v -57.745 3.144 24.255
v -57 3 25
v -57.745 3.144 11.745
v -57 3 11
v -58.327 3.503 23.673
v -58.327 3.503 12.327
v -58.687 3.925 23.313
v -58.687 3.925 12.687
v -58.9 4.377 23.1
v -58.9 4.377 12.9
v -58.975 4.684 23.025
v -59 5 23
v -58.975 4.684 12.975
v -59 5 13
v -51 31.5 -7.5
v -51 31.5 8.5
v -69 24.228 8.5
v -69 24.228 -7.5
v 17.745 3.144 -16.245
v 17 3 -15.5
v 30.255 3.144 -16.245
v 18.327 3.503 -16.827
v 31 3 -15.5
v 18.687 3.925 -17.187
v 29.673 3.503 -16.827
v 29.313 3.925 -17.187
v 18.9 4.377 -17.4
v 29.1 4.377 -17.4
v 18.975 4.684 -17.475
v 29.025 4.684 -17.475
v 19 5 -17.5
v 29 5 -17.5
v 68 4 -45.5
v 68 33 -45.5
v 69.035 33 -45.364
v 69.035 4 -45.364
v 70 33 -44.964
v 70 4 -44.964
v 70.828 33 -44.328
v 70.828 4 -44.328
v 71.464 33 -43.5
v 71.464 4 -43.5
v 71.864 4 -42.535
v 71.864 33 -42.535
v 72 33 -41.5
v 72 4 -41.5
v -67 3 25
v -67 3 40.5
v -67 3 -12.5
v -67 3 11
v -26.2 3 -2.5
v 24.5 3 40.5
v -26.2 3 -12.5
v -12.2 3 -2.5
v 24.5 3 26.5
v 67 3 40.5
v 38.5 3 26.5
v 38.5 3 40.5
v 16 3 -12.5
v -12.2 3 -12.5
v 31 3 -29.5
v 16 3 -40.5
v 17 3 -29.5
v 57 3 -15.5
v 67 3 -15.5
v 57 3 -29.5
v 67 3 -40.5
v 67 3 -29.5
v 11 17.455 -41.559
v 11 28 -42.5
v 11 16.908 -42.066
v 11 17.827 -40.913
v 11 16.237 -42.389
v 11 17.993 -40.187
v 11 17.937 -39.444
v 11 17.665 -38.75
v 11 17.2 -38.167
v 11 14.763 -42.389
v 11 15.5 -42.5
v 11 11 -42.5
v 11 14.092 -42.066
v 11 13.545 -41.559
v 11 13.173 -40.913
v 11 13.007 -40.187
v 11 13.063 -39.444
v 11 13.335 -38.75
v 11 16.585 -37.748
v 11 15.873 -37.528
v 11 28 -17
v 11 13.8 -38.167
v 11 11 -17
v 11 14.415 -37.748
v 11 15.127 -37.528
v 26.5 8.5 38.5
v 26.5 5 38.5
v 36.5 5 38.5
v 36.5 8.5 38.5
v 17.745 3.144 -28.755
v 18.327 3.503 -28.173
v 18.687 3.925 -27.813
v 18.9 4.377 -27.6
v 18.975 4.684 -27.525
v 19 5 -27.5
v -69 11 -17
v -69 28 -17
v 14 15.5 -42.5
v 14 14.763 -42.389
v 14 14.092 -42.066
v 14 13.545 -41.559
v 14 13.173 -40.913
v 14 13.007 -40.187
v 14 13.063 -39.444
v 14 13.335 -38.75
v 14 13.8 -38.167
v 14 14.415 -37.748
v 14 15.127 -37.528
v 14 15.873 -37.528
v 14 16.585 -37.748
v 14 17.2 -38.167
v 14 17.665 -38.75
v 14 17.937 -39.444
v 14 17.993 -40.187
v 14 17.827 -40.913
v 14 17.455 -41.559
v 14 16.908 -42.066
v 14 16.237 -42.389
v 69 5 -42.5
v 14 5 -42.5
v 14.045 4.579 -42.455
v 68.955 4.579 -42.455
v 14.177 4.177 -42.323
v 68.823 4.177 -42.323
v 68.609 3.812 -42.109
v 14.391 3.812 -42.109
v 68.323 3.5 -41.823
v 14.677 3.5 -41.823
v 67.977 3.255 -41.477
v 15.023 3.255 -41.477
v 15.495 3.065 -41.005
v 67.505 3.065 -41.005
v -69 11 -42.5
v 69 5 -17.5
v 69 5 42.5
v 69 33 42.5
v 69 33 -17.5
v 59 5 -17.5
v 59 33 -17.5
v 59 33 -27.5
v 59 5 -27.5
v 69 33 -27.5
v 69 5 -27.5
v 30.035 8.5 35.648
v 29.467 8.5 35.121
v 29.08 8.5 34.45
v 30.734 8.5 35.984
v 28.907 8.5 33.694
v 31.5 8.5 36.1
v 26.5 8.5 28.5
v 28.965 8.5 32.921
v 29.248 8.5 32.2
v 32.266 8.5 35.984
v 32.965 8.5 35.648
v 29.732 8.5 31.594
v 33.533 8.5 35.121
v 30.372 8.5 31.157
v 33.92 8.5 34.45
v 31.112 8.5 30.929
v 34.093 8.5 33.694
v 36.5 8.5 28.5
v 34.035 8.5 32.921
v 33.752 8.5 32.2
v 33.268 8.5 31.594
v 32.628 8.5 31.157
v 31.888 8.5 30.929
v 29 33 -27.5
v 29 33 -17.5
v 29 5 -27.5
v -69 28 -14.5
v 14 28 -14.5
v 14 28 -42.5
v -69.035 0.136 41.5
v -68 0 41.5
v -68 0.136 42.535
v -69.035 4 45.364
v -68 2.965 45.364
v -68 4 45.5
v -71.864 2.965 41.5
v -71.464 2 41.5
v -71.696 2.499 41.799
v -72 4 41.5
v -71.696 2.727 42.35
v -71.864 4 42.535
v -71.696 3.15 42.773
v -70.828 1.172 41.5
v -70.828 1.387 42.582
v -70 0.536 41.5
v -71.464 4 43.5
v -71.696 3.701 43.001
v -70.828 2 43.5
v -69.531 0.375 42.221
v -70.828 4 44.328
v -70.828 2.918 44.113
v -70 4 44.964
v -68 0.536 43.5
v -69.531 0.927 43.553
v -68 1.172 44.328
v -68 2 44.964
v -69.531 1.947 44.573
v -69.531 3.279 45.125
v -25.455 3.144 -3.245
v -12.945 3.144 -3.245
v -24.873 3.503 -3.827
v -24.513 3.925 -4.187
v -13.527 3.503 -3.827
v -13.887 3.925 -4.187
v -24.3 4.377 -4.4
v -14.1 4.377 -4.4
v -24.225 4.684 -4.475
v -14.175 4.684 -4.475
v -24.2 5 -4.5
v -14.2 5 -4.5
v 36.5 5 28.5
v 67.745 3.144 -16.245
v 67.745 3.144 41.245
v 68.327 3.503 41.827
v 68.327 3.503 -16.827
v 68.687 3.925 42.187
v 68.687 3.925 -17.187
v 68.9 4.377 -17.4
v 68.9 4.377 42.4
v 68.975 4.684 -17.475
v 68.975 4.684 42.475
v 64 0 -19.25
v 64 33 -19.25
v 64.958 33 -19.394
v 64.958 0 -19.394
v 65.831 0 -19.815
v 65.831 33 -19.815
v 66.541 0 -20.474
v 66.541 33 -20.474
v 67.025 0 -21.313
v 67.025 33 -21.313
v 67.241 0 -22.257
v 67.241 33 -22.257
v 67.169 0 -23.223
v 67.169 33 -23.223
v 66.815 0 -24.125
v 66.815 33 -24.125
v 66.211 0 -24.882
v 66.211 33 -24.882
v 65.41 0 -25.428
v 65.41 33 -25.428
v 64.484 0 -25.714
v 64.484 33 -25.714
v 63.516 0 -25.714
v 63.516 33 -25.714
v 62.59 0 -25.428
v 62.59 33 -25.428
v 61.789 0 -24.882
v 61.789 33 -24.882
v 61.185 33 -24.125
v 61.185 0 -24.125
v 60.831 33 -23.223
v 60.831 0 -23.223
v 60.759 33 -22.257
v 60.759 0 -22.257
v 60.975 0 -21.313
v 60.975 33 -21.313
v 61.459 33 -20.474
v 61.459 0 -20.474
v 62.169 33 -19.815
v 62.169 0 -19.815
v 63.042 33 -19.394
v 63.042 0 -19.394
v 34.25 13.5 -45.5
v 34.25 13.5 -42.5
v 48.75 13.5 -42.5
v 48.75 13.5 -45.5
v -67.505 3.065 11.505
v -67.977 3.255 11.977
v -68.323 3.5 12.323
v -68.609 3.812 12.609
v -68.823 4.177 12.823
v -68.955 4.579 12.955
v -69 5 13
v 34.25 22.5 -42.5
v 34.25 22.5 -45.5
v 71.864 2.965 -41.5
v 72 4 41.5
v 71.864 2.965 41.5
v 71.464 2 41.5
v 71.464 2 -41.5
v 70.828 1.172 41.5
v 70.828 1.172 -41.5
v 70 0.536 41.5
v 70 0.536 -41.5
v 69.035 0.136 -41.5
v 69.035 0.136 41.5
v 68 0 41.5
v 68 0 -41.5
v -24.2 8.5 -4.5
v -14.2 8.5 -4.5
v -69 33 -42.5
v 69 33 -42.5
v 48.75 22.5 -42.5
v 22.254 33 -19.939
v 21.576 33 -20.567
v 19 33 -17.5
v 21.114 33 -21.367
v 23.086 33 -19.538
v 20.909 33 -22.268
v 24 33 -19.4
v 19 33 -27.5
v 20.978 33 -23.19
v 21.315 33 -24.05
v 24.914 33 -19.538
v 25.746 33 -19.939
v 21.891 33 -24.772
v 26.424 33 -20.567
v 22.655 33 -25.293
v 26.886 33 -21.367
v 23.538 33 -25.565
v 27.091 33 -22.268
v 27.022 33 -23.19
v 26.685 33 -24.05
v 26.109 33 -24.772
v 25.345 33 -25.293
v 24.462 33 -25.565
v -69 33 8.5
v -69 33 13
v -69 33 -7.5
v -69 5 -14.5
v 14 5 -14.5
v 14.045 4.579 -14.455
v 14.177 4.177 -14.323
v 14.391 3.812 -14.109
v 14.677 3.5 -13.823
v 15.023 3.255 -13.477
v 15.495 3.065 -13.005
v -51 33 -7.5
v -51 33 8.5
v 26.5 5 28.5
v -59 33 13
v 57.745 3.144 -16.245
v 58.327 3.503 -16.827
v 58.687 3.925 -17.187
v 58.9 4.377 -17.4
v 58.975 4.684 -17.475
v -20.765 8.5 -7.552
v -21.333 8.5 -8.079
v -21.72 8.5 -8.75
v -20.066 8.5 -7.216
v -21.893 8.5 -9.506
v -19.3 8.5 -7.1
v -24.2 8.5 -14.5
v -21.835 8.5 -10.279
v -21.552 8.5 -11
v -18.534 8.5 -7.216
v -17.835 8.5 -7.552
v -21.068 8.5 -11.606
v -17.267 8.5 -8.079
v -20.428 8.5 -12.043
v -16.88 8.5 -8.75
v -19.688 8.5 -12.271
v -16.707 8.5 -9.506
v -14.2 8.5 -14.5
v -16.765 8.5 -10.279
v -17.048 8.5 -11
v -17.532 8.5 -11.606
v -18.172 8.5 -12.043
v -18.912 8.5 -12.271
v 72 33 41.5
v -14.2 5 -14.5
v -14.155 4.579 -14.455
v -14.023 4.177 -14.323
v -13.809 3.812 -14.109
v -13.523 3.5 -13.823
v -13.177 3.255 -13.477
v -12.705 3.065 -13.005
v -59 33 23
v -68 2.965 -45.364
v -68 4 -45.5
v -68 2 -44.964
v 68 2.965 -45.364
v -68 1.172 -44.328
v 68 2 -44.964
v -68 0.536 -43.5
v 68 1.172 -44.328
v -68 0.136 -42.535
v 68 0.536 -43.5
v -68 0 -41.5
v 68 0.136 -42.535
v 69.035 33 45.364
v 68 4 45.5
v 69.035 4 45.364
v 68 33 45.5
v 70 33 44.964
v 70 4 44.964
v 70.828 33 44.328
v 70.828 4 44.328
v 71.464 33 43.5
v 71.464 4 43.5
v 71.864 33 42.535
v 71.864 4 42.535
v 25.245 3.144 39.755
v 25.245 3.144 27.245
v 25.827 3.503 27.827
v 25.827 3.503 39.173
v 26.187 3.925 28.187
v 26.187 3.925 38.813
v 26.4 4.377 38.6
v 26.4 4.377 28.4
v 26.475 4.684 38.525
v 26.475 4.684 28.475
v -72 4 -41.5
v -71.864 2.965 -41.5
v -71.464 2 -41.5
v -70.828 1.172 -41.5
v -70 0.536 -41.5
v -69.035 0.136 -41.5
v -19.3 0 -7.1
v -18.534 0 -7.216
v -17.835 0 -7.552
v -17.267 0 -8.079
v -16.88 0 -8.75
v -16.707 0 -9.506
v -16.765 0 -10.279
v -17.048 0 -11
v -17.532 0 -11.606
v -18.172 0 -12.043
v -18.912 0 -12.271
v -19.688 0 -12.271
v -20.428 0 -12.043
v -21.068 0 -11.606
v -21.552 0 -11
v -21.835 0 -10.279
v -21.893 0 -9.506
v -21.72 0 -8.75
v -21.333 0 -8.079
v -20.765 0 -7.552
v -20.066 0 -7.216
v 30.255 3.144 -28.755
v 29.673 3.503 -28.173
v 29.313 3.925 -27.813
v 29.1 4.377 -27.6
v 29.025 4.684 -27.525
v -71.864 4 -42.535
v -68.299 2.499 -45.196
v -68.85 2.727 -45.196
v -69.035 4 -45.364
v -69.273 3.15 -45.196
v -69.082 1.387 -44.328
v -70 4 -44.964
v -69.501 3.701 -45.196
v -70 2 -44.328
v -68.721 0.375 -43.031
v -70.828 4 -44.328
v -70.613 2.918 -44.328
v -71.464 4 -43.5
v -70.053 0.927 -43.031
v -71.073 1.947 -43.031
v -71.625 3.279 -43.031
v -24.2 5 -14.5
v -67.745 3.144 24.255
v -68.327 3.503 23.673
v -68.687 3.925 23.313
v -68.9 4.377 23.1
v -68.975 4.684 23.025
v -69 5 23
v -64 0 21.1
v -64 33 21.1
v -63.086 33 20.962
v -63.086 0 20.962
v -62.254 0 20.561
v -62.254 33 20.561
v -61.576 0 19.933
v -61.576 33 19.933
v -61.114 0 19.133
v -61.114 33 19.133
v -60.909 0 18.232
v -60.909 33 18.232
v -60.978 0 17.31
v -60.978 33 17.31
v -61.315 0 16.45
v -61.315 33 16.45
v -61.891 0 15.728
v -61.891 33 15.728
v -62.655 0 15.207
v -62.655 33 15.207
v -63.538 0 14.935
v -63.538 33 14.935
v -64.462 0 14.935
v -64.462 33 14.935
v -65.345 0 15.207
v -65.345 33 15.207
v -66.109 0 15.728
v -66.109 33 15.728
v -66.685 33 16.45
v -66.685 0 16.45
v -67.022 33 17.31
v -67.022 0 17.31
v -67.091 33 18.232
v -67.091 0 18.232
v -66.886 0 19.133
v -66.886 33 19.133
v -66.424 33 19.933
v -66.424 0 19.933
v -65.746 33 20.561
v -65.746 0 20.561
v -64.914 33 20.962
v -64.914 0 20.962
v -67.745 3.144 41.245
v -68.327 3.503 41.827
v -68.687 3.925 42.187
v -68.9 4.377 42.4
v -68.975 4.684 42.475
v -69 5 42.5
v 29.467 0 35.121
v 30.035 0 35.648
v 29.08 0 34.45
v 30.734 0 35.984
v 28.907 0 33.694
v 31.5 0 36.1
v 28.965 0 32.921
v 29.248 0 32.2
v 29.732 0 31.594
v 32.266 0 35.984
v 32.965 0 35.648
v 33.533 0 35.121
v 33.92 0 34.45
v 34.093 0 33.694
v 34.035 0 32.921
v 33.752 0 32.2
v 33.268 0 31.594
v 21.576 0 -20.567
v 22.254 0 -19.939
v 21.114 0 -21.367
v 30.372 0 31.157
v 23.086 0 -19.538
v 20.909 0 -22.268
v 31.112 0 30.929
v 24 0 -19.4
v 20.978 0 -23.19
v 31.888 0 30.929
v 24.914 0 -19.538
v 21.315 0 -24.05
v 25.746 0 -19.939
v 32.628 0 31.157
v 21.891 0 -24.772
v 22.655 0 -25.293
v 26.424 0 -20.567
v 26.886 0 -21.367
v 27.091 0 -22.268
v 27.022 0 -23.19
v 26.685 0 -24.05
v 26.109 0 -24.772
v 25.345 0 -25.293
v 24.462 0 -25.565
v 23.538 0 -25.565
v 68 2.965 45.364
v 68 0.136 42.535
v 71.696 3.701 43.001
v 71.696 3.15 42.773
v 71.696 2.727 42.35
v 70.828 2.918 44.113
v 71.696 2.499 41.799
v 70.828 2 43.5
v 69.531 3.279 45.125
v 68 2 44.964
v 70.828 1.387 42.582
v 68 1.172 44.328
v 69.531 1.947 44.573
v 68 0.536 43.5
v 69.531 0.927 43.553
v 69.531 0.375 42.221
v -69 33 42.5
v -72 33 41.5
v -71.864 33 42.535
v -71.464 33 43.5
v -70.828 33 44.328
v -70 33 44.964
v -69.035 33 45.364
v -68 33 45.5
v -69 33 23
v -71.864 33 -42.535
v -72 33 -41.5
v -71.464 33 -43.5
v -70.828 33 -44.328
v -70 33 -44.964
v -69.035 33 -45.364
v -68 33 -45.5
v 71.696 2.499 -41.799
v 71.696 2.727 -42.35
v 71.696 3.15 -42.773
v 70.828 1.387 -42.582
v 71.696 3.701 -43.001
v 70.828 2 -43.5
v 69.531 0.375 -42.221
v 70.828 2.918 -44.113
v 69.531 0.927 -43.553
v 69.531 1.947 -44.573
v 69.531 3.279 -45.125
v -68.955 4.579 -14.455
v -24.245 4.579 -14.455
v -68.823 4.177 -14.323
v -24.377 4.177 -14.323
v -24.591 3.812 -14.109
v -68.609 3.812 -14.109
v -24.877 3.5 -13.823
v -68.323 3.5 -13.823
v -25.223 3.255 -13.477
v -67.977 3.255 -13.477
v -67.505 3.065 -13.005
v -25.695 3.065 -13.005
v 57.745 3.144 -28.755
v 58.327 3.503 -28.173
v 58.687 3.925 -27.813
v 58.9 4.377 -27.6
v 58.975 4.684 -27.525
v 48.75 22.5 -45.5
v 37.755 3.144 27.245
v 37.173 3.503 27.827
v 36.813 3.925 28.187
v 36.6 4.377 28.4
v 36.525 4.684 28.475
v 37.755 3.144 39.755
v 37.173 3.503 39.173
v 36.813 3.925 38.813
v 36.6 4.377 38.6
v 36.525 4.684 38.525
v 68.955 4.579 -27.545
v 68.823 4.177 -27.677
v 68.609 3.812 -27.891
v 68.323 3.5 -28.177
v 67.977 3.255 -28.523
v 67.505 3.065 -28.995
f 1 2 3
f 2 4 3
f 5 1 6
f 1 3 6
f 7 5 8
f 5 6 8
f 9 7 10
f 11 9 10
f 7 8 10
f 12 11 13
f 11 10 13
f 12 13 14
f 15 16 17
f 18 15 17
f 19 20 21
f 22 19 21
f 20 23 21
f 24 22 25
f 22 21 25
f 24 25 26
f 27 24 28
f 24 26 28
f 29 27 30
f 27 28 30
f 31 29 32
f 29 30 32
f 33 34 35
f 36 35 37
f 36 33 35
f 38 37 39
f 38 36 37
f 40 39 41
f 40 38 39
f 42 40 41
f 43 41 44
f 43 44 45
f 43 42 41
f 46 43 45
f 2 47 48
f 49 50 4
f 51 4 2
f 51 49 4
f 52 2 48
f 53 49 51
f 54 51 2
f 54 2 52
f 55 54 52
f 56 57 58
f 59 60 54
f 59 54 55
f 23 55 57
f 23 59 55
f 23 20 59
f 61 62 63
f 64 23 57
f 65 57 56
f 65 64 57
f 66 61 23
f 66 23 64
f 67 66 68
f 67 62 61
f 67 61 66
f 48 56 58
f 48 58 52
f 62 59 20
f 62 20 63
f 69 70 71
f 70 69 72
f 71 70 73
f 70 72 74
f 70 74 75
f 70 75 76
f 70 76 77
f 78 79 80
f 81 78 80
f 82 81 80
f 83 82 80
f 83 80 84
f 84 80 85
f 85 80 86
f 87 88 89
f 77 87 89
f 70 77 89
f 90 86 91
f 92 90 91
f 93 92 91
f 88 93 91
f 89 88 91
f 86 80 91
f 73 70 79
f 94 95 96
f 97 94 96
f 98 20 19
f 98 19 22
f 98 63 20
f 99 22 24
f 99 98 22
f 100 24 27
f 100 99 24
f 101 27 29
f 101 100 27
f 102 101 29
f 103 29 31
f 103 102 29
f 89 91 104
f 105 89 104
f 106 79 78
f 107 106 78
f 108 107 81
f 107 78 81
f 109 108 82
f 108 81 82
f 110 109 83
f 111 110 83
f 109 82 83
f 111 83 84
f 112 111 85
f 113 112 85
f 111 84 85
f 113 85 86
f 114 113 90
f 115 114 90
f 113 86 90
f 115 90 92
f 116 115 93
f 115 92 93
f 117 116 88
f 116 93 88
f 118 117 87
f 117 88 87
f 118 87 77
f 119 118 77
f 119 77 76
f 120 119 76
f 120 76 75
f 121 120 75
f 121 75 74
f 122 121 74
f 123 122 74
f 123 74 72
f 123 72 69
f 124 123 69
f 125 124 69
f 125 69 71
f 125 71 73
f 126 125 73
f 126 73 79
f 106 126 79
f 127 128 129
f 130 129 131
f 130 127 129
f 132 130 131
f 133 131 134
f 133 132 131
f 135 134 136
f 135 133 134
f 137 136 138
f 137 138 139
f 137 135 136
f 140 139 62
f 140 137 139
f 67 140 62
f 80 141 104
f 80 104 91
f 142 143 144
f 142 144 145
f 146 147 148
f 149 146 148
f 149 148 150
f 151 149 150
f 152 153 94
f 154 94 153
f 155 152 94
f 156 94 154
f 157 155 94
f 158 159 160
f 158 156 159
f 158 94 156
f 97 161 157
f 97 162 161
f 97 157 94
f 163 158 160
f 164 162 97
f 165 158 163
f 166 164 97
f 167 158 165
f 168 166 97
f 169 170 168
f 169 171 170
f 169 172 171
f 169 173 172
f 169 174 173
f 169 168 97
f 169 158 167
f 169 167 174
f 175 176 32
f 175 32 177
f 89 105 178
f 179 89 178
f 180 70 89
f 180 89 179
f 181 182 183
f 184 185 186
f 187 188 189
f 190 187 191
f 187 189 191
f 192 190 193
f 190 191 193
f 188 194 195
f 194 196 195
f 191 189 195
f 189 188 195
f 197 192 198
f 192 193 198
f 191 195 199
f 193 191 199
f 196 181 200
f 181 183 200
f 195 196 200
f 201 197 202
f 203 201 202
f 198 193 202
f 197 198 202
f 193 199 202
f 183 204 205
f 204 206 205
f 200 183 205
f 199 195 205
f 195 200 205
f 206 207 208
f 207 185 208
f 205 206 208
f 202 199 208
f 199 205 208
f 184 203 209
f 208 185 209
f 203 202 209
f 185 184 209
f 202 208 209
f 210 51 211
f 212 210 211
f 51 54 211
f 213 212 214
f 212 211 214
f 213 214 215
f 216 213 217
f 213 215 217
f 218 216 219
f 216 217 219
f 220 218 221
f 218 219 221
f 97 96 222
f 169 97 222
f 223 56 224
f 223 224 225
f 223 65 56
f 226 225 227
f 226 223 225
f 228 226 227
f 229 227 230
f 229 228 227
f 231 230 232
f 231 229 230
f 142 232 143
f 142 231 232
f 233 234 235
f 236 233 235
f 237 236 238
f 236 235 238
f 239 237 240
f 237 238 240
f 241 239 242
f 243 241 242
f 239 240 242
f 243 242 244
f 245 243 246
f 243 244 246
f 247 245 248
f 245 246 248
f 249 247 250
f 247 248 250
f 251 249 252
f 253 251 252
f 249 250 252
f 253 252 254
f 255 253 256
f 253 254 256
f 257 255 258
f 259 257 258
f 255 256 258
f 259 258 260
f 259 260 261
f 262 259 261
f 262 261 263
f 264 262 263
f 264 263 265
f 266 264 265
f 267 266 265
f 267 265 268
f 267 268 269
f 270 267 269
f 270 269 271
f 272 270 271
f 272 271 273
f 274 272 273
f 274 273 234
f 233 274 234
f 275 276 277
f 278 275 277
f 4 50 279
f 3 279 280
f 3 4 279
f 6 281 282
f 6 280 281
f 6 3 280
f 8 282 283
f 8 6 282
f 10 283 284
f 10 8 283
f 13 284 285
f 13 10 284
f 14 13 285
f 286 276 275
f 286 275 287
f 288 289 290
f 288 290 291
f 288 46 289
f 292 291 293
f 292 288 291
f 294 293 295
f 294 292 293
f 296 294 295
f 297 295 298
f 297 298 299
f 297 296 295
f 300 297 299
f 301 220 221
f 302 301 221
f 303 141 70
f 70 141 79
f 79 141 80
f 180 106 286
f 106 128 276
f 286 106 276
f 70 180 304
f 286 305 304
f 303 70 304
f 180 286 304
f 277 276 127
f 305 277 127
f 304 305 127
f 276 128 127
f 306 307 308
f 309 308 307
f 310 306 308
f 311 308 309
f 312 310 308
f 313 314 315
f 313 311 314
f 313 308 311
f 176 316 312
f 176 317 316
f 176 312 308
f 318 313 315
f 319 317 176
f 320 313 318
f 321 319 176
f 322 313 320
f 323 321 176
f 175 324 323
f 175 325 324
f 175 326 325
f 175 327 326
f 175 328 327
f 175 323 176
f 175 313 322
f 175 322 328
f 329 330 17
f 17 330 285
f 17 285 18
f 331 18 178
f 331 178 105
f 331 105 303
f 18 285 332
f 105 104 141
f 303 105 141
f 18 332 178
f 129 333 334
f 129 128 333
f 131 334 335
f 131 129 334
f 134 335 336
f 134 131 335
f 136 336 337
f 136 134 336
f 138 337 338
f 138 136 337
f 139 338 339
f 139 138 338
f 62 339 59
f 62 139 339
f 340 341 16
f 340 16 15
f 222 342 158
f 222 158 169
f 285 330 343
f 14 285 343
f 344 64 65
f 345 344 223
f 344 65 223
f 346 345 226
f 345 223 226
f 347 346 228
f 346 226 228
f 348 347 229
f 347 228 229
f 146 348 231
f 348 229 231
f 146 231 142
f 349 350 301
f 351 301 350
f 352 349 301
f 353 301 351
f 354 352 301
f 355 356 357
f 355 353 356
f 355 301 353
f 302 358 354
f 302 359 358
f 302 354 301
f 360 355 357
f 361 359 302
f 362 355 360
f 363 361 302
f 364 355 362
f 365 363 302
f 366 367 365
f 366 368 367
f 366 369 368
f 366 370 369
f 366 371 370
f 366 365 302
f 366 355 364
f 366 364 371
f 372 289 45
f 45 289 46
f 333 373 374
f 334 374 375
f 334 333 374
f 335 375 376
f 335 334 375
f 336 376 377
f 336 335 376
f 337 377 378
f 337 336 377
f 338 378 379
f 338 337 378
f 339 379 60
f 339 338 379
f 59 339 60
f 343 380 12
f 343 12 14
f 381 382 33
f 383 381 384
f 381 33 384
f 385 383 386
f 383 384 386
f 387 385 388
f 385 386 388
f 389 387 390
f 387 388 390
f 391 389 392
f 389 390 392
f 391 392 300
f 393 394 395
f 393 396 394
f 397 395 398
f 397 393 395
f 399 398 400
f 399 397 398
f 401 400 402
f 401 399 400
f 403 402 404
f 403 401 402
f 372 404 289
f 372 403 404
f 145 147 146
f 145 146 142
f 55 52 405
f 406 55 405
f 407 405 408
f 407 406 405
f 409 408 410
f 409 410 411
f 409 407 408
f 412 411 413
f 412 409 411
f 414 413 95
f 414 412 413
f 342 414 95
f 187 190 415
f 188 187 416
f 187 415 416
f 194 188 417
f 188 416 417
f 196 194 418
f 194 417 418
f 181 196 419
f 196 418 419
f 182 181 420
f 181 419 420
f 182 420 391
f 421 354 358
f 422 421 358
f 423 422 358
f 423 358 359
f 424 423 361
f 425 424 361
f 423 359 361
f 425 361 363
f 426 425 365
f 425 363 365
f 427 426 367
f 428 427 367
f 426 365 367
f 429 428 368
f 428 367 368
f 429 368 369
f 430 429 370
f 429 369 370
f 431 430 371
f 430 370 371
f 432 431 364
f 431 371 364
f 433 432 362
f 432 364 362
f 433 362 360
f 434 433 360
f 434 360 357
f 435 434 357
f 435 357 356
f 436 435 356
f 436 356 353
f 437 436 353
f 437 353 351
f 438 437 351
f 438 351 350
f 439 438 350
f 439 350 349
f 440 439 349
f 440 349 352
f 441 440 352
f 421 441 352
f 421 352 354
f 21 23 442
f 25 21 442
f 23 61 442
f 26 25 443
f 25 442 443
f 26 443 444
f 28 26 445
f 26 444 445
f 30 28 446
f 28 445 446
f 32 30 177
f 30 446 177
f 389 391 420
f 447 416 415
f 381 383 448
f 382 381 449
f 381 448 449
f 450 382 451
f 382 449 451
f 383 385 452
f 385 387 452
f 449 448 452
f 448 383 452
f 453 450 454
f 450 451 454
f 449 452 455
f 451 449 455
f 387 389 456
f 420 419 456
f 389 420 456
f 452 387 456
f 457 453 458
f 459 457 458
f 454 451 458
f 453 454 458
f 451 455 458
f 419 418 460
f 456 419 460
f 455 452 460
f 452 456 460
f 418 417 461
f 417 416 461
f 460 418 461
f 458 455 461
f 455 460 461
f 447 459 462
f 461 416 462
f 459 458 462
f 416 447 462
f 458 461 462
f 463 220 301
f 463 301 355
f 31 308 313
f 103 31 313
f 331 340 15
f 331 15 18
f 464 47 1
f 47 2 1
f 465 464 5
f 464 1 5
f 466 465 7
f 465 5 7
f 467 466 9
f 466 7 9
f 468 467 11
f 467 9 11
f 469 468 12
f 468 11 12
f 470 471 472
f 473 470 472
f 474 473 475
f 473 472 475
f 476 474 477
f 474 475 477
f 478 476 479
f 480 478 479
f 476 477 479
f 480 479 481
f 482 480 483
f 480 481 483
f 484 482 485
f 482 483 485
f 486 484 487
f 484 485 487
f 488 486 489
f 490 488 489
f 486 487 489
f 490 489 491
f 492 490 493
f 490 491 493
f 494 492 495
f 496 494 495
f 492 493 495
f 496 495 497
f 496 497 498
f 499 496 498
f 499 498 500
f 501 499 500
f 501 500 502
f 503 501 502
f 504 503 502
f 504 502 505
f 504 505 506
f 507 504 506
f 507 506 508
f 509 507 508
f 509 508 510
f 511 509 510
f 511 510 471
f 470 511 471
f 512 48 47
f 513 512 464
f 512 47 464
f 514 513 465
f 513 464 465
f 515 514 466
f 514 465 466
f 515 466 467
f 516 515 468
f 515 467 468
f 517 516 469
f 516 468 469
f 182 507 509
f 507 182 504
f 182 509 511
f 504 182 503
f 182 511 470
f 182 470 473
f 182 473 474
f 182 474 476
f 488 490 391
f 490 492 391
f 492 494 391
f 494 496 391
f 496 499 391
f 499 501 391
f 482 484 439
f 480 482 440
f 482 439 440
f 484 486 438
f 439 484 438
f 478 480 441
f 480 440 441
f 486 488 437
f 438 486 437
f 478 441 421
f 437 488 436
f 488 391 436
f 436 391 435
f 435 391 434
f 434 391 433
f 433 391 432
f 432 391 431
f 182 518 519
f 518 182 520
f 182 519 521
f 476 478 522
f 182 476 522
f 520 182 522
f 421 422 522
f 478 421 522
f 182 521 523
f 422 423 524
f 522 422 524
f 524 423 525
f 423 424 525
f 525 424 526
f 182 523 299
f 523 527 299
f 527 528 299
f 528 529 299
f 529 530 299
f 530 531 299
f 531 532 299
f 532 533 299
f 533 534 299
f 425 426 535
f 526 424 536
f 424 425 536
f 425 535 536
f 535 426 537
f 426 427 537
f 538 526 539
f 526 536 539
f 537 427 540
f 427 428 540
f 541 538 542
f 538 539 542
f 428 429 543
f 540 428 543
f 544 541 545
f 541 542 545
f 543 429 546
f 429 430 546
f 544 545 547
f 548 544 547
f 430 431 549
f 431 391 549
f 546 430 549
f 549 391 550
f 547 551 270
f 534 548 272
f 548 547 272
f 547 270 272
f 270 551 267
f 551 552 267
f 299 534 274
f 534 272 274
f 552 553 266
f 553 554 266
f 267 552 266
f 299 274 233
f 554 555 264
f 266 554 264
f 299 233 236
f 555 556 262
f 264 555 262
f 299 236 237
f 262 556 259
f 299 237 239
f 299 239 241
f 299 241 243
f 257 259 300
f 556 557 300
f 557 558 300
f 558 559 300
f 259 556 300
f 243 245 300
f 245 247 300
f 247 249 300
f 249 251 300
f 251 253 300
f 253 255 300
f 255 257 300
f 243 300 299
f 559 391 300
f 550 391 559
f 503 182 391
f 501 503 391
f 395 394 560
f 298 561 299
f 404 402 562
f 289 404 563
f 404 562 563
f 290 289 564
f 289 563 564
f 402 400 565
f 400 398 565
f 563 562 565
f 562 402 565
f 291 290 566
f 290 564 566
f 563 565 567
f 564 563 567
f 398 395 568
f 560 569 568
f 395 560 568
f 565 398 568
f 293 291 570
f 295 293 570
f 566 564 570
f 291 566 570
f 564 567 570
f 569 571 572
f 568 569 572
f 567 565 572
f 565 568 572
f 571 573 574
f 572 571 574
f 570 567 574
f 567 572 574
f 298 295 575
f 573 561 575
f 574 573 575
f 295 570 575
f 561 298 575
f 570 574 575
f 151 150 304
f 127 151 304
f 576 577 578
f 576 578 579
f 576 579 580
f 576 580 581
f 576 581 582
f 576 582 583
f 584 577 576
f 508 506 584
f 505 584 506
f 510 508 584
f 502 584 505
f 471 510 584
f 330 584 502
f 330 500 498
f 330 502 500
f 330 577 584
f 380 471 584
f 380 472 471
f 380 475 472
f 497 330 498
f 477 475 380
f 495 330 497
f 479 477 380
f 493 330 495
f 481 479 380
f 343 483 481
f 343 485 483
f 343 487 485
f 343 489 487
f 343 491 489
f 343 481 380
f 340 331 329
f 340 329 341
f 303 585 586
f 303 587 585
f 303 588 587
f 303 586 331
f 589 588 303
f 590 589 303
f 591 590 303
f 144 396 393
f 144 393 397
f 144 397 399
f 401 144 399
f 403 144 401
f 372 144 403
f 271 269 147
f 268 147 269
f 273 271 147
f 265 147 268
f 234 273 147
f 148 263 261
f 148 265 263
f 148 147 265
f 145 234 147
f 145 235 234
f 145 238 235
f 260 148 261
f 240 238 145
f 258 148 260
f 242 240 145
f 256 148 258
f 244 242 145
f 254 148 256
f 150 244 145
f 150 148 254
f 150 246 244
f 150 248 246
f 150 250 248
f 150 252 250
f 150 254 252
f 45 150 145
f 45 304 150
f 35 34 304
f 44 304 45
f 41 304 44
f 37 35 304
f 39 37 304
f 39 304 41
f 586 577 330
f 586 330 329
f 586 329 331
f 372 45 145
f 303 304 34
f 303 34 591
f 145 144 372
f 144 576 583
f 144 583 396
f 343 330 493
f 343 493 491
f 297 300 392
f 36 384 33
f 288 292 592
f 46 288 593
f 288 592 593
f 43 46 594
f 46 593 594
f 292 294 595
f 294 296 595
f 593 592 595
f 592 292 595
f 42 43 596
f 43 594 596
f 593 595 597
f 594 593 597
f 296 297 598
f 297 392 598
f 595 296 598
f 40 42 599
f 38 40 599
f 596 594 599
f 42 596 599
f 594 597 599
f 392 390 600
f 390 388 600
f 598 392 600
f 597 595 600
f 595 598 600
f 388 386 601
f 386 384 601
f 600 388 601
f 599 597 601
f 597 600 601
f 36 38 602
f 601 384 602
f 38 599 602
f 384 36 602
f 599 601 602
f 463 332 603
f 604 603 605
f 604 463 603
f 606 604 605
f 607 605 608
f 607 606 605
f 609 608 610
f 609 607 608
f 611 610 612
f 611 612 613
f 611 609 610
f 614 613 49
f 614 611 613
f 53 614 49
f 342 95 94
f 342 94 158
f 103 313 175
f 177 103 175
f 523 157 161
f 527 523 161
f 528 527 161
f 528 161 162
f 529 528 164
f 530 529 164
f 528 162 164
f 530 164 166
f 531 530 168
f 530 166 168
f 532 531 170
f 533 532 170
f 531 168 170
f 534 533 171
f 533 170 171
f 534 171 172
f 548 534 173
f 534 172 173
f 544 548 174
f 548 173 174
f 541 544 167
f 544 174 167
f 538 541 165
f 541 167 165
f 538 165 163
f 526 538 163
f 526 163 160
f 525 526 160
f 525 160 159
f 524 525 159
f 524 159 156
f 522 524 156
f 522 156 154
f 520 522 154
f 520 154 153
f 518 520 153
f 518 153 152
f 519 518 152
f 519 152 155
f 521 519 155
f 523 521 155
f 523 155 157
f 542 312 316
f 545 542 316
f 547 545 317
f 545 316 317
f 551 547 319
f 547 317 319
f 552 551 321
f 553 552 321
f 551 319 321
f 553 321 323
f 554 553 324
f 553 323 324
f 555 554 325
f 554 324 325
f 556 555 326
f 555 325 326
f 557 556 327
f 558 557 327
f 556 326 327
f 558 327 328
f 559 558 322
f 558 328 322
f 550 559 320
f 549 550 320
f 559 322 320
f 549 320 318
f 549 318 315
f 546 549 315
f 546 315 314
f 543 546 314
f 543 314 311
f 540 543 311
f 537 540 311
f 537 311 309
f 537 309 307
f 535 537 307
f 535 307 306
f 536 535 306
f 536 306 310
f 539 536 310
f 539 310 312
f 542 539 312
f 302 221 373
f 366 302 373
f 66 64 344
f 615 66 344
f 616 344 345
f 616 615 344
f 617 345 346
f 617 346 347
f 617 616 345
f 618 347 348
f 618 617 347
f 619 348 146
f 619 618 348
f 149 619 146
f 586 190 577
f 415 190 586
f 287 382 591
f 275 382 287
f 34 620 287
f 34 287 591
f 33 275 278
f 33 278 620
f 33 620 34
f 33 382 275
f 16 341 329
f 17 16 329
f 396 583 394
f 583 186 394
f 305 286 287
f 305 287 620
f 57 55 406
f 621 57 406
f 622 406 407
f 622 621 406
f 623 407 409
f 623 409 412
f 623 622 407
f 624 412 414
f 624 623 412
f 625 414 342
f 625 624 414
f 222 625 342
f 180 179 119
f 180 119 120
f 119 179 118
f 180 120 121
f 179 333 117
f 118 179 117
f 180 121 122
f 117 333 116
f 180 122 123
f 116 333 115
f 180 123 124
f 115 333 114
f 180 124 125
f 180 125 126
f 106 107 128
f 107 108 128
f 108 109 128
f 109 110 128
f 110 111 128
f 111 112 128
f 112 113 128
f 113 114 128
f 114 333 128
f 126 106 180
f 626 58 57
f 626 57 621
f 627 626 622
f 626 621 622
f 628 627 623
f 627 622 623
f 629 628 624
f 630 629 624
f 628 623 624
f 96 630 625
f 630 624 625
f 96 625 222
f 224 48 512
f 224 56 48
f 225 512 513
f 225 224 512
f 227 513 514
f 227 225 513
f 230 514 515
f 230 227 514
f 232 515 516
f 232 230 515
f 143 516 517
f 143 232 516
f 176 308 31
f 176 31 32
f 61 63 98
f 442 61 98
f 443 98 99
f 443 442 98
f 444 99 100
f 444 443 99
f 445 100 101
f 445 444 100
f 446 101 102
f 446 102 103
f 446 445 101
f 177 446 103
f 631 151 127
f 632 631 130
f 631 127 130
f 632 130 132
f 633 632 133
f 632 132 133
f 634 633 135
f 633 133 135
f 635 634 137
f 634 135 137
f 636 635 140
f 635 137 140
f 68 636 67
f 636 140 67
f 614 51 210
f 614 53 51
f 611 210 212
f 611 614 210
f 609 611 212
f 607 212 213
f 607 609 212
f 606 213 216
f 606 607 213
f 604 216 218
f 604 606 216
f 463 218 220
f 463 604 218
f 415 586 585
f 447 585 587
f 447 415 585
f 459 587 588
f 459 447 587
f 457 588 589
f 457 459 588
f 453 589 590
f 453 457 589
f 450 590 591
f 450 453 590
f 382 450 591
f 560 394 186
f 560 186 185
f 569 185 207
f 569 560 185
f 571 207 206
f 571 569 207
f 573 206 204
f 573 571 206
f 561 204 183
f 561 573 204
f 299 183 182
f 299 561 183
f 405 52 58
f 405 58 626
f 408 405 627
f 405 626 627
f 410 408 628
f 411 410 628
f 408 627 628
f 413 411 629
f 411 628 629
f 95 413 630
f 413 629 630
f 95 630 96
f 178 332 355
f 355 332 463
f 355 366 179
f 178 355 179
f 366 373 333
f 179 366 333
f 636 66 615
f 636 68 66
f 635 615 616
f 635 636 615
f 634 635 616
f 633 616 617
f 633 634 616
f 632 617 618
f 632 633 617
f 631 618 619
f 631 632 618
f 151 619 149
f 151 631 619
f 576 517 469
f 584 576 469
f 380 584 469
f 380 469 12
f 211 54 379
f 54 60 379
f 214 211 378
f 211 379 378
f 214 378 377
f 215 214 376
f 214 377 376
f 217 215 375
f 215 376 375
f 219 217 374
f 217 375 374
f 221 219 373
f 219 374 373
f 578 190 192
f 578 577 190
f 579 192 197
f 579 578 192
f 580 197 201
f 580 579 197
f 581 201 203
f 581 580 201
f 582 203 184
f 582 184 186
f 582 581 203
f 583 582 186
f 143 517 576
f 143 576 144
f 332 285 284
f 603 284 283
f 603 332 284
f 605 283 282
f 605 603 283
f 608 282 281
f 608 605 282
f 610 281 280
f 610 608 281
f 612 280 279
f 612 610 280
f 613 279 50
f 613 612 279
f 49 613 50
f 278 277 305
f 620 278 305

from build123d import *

# Parameters (mm, degrees)
CROQUIS1_W               = 138
CROQUIS1_H               = 85
SALIENTE_EXTRUIR1_DEPTH  = 3
CROQUIS3_W               = 144
CROQUIS3_H               = 91
CROQUIS3_W_2             = 138
CROQUIS3_H_2             = 85
SALIENTE_EXTRUIR3_DEPTH  = 3
CROQUIS7_W               = 144
CROQUIS7_H               = 91
CROQUIS7_W_2             = 138
CROQUIS7_H_2             = 85
SALIENTE_EXTRUIR4_DEPTH  = 30
CROQUIS8_W               = 10
CROQUIS8_H               = 10
SALIENTE_EXTRUIR5_DEPTH  = 5.5
CROQUIS9_W               = 16
CROQUIS9_H               = 1.5
SALIENTE_EXTRUIR6_DEPTH  = 18
SALIENTE_EXTRUIR7_DEPTH  = 16
CROQUIS11_W              = 83
CROQUIS11_H              = 28
SALIENTE_EXTRUIR8_DEPTH  = 8
SALIENTE_EXTRUIR9_DEPTH  = 17
CORTAR_EXTRUIR1_REACH    = 102.241
CROQUIS14_R              = 2.5
CORTAR_EXTRUIR2_REACH    = 90.626
CROQUIS15_R              = 2.6
CORTAR_EXTRUIR3_REACH    = 120.393
CROQUIS16_W              = 14.5
CROQUIS16_H              = 9
CROQUIS17_W              = 10
CROQUIS17_H              = 10
SALIENTE_EXTRUIR10_DEPTH = 30
CORTAR_EXTRUIR4_REACH    = 93.341
CROQUIS18_R              = 3.1
CROQUIS18_R_2            = 3.25
REDONDEO1_R              = 2
REDONDEO2_R              = 4
CORTAR_EXTRUIR5_REACH    = 90.626
CROQUIS21_R              = 2.6


with BuildPart() as part:
    # Croquis1 → Saliente-Extruir1 (new body)
    with BuildSketch(Plane(origin=(0, 0, 0), x_dir=(1, 0, 0), z_dir=(0, 1, 0))):
        Rectangle(CROQUIS1_W, CROQUIS1_H)
    extrude(amount=SALIENTE_EXTRUIR1_DEPTH)

    # Croquis3 → Saliente-Extruir3 (add)
    with BuildSketch(Plane(origin=(0, 3, 0), x_dir=(1, 0, 0), z_dir=(0, 1, 0))):
        Rectangle(CROQUIS3_W, CROQUIS3_H)
        Rectangle(CROQUIS3_W_2, CROQUIS3_H_2, mode=Mode.SUBTRACT)
    extrude(amount=-SALIENTE_EXTRUIR3_DEPTH)

    # Croquis7 → Saliente-Extruir4 (add)
    with BuildSketch(Plane(origin=(0, 3, 0), x_dir=(1, 0, 0), z_dir=(0, 1, 0))):
        Rectangle(CROQUIS7_W, CROQUIS7_H)
        Rectangle(CROQUIS7_W_2, CROQUIS7_H_2, mode=Mode.SUBTRACT)
    extrude(amount=SALIENTE_EXTRUIR4_DEPTH)

    # Croquis8 → Saliente-Extruir5 (add)
    with BuildSketch(Plane(origin=(0, 3, 0), x_dir=(1, 0, 0), z_dir=(0, 1, 0))):
        with Locations((-19.2, 9.5)):
            Rectangle(CROQUIS8_W, CROQUIS8_H)
        with Locations((31.5, -33.5)):
            Rectangle(CROQUIS8_W, CROQUIS8_H)
    extrude(amount=SALIENTE_EXTRUIR5_DEPTH)

    # Croquis9 → Saliente-Extruir6 (add)
    with BuildSketch(Plane(origin=(-69, 0, 0), x_dir=(0, 0, -1), z_dir=(1, 0, 0))):
        with Locations((-0.5, 32.25)):
            Rectangle(CROQUIS9_W, CROQUIS9_H)
    extrude(amount=SALIENTE_EXTRUIR6_DEPTH)

    # Croquis10 → Saliente-Extruir7 (add)
    with BuildSketch(Plane.XY.offset(8.5)):
        Polygon((-51, 31.5), (-69, 24.227527935), (-69, 33), (-51, 33), align=None)
    extrude(amount=-SALIENTE_EXTRUIR7_DEPTH)

    # Croquis11 → Saliente-Extruir8 (add)
    with BuildSketch(Plane(origin=(0, 3, 0), x_dir=(1, 0, 0), z_dir=(0, 1, 0))):
        with Locations((-27.5, 28.5)):
            Rectangle(CROQUIS11_W, CROQUIS11_H)
    extrude(amount=SALIENTE_EXTRUIR8_DEPTH)

    # Croquis12 → Saliente-Extruir9 (add)
    with BuildSketch(Plane(origin=(0, 11, 0), x_dir=(1, 0, 0), z_dir=(0, 1, 0))):
        Polygon((14, 42.5), (11, 42.5), (11, 17), (-69, 17), (-69, 14.5), (14, 14.5), align=None)
    extrude(amount=SALIENTE_EXTRUIR9_DEPTH)

    # Croquis14 → Cortar-Extruir1 (cut, up to next)
    with BuildSketch(Plane.ZY.offset(-11), mode=Mode.PRIVATE) as cortar_extruir1_sk1:
        with Locations(Location((-40, 15.5, 0), (0, 0, 180))):
            Circle(CROQUIS14_R)
    cortar_extruir1_tool1 = extrude(cortar_extruir1_sk1.sketch, amount=-CORTAR_EXTRUIR1_REACH, mode=Mode.PRIVATE) & part.part
    add(cortar_extruir1_tool1.solids().sort_by_distance((11, 15.5, -40))[0], mode=Mode.SUBTRACT)

    # Croquis15 → Cortar-Extruir2 (cut, up to next)
    with BuildSketch(Plane(origin=(0, 8.5, 0), x_dir=(1, 0, 0), z_dir=(0, 1, 0)), mode=Mode.PRIVATE) as cortar_extruir2_sk1:
        with Locations(Location((31.5, -33.5, 0), (0, 0, 270))):
            Circle(CROQUIS15_R)
    cortar_extruir2_tool1 = extrude(cortar_extruir2_sk1.sketch, amount=-CORTAR_EXTRUIR2_REACH, mode=Mode.PRIVATE) & part.part
    add(cortar_extruir2_tool1.solids().sort_by_distance((31.5, 8.5, 33.5))[0], mode=Mode.SUBTRACT)

    # Croquis16 → Cortar-Extruir3 (cut, up to next)
    with BuildSketch(Plane.XY.offset(-42.5), mode=Mode.PRIVATE) as cortar_extruir3_sk1:
        with Locations((41.5, 18)):
            Rectangle(CROQUIS16_W, CROQUIS16_H)
    cortar_extruir3_tool1 = extrude(cortar_extruir3_sk1.sketch, amount=-CORTAR_EXTRUIR3_REACH, mode=Mode.PRIVATE) & part.part
    add(cortar_extruir3_tool1.solids().sort_by_distance((41.5, 18, -42.5))[0], mode=Mode.SUBTRACT)

    # Croquis17 → Saliente-Extruir10 (add)
    with BuildSketch(Plane(origin=(0, 3, 0), x_dir=(1, 0, 0), z_dir=(0, 1, 0))):
        with Locations((-64, -18)):
            Rectangle(CROQUIS17_W, CROQUIS17_H)
        with Locations((64, 22.5)):
            Rectangle(CROQUIS17_W, CROQUIS17_H)
        with Locations((24, 22.5)):
            Rectangle(CROQUIS17_W, CROQUIS17_H)
    extrude(amount=SALIENTE_EXTRUIR10_DEPTH)

    # Croquis18 → Cortar-Extruir4 (cut, up to next)
    with BuildSketch(Plane(origin=(0, 33, 0), x_dir=(1, 0, 0), z_dir=(0, 1, 0)), mode=Mode.PRIVATE) as cortar_extruir4_sk1:
        with Locations(Location((-64, -18, 0), (0, 0, 270))):
            Circle(CROQUIS18_R)
    cortar_extruir4_tool1 = extrude(cortar_extruir4_sk1.sketch, amount=-CORTAR_EXTRUIR4_REACH, mode=Mode.PRIVATE) & part.part
    # Croquis18 → Cortar-Extruir4 (cut, up to next)
    with BuildSketch(Plane(origin=(0, 33, 0), x_dir=(1, 0, 0), z_dir=(0, 1, 0)), mode=Mode.PRIVATE) as cortar_extruir4_sk2:
        with Locations(Location((24, 22.5, 0), (0, 0, 270))):
            Circle(CROQUIS18_R)
    cortar_extruir4_tool2 = extrude(cortar_extruir4_sk2.sketch, amount=-CORTAR_EXTRUIR4_REACH, mode=Mode.PRIVATE) & part.part
    # Croquis18 → Cortar-Extruir4 (cut, up to next)
    with BuildSketch(Plane(origin=(0, 33, 0), x_dir=(1, 0, 0), z_dir=(0, 1, 0)), mode=Mode.PRIVATE) as cortar_extruir4_sk3:
        with Locations(Location((64, 22.5, 0), (0, 0, 270))):
            Circle(CROQUIS18_R_2)
    cortar_extruir4_tool3 = extrude(cortar_extruir4_sk3.sketch, amount=-CORTAR_EXTRUIR4_REACH, mode=Mode.PRIVATE) & part.part
    add(cortar_extruir4_tool1.solids().sort_by_distance((-64, 33, 18))[0], mode=Mode.SUBTRACT)
    add(cortar_extruir4_tool2.solids().sort_by_distance((24, 33, -22.5))[0], mode=Mode.SUBTRACT)
    add(cortar_extruir4_tool3.solids().sort_by_distance((64, 33, -22.5))[0], mode=Mode.SUBTRACT)

    # Redondeo1
    redondeo1_edges = [part.edges().sort_by_distance(p)[0] for p in [
        (-69, 3, -0.75),
        (-0.1, 3, -14.5),
        (-46.6, 3, -14.5),
        (14, 3, -28.5),
        (-69, 3, 32.75),
        (-64, 3, 23),
        (-59, 3, 18),
        (-64, 3, 13),
        (69, 3, -35),
        (64, 3, -27.5),
        (59, 3, -22.5),
        (64, 3, -17.5),
        (19, 3, -22.5),
        (24, 3, -17.5),
        (29, 3, -22.5),
        (24, 3, -27.5),
        (0, 3, 42.5),
        (69, 3, 12.5),
        (41.5, 3, -42.5),
        (-14.2, 3, -9.5),
        (-24.2, 3, -9.5),
        (-19.2, 3, -4.5),
        (36.5, 3, 33.5),
        (31.5, 3, 28.5),
        (26.5, 3, 33.5),
        (31.5, 3, 38.5),
    ]]
    fillet(redondeo1_edges, radius=REDONDEO1_R - 0.0001)  # a hair under: the kernel refuses the full size

    # Redondeo2
    redondeo2_edges = [part.edges().sort_by_distance(p)[0] for p in [
        (0, 0, 45.5),
        (72, 16.5, 45.5),
        (-72, 0, 0),
        (-72, 16.5, 45.5),
        (0, 0, -45.5),
        (-72, 16.5, -45.5),
        (72, 0, 0),
        (72, 16.5, -45.5),
    ]]
    fillet(redondeo2_edges, radius=REDONDEO2_R)

    # Croquis21 → Cortar-Extruir5 (cut, up to next)
    with BuildSketch(Plane(origin=(0, 8.5, 0), x_dir=(1, 0, 0), z_dir=(0, 1, 0)), mode=Mode.PRIVATE) as cortar_extruir5_sk1:
        with Locations(Location((-19.3, 9.7, 0), (0, 0, 270))):
            Circle(CROQUIS21_R)
    cortar_extruir5_tool1 = extrude(cortar_extruir5_sk1.sketch, amount=-CORTAR_EXTRUIR5_REACH, mode=Mode.PRIVATE) & part.part
    add(cortar_extruir5_tool1.solids().sort_by_distance((-19.3, 8.5, -9.7))[0], mode=Mode.SUBTRACT)


solid = part.part
